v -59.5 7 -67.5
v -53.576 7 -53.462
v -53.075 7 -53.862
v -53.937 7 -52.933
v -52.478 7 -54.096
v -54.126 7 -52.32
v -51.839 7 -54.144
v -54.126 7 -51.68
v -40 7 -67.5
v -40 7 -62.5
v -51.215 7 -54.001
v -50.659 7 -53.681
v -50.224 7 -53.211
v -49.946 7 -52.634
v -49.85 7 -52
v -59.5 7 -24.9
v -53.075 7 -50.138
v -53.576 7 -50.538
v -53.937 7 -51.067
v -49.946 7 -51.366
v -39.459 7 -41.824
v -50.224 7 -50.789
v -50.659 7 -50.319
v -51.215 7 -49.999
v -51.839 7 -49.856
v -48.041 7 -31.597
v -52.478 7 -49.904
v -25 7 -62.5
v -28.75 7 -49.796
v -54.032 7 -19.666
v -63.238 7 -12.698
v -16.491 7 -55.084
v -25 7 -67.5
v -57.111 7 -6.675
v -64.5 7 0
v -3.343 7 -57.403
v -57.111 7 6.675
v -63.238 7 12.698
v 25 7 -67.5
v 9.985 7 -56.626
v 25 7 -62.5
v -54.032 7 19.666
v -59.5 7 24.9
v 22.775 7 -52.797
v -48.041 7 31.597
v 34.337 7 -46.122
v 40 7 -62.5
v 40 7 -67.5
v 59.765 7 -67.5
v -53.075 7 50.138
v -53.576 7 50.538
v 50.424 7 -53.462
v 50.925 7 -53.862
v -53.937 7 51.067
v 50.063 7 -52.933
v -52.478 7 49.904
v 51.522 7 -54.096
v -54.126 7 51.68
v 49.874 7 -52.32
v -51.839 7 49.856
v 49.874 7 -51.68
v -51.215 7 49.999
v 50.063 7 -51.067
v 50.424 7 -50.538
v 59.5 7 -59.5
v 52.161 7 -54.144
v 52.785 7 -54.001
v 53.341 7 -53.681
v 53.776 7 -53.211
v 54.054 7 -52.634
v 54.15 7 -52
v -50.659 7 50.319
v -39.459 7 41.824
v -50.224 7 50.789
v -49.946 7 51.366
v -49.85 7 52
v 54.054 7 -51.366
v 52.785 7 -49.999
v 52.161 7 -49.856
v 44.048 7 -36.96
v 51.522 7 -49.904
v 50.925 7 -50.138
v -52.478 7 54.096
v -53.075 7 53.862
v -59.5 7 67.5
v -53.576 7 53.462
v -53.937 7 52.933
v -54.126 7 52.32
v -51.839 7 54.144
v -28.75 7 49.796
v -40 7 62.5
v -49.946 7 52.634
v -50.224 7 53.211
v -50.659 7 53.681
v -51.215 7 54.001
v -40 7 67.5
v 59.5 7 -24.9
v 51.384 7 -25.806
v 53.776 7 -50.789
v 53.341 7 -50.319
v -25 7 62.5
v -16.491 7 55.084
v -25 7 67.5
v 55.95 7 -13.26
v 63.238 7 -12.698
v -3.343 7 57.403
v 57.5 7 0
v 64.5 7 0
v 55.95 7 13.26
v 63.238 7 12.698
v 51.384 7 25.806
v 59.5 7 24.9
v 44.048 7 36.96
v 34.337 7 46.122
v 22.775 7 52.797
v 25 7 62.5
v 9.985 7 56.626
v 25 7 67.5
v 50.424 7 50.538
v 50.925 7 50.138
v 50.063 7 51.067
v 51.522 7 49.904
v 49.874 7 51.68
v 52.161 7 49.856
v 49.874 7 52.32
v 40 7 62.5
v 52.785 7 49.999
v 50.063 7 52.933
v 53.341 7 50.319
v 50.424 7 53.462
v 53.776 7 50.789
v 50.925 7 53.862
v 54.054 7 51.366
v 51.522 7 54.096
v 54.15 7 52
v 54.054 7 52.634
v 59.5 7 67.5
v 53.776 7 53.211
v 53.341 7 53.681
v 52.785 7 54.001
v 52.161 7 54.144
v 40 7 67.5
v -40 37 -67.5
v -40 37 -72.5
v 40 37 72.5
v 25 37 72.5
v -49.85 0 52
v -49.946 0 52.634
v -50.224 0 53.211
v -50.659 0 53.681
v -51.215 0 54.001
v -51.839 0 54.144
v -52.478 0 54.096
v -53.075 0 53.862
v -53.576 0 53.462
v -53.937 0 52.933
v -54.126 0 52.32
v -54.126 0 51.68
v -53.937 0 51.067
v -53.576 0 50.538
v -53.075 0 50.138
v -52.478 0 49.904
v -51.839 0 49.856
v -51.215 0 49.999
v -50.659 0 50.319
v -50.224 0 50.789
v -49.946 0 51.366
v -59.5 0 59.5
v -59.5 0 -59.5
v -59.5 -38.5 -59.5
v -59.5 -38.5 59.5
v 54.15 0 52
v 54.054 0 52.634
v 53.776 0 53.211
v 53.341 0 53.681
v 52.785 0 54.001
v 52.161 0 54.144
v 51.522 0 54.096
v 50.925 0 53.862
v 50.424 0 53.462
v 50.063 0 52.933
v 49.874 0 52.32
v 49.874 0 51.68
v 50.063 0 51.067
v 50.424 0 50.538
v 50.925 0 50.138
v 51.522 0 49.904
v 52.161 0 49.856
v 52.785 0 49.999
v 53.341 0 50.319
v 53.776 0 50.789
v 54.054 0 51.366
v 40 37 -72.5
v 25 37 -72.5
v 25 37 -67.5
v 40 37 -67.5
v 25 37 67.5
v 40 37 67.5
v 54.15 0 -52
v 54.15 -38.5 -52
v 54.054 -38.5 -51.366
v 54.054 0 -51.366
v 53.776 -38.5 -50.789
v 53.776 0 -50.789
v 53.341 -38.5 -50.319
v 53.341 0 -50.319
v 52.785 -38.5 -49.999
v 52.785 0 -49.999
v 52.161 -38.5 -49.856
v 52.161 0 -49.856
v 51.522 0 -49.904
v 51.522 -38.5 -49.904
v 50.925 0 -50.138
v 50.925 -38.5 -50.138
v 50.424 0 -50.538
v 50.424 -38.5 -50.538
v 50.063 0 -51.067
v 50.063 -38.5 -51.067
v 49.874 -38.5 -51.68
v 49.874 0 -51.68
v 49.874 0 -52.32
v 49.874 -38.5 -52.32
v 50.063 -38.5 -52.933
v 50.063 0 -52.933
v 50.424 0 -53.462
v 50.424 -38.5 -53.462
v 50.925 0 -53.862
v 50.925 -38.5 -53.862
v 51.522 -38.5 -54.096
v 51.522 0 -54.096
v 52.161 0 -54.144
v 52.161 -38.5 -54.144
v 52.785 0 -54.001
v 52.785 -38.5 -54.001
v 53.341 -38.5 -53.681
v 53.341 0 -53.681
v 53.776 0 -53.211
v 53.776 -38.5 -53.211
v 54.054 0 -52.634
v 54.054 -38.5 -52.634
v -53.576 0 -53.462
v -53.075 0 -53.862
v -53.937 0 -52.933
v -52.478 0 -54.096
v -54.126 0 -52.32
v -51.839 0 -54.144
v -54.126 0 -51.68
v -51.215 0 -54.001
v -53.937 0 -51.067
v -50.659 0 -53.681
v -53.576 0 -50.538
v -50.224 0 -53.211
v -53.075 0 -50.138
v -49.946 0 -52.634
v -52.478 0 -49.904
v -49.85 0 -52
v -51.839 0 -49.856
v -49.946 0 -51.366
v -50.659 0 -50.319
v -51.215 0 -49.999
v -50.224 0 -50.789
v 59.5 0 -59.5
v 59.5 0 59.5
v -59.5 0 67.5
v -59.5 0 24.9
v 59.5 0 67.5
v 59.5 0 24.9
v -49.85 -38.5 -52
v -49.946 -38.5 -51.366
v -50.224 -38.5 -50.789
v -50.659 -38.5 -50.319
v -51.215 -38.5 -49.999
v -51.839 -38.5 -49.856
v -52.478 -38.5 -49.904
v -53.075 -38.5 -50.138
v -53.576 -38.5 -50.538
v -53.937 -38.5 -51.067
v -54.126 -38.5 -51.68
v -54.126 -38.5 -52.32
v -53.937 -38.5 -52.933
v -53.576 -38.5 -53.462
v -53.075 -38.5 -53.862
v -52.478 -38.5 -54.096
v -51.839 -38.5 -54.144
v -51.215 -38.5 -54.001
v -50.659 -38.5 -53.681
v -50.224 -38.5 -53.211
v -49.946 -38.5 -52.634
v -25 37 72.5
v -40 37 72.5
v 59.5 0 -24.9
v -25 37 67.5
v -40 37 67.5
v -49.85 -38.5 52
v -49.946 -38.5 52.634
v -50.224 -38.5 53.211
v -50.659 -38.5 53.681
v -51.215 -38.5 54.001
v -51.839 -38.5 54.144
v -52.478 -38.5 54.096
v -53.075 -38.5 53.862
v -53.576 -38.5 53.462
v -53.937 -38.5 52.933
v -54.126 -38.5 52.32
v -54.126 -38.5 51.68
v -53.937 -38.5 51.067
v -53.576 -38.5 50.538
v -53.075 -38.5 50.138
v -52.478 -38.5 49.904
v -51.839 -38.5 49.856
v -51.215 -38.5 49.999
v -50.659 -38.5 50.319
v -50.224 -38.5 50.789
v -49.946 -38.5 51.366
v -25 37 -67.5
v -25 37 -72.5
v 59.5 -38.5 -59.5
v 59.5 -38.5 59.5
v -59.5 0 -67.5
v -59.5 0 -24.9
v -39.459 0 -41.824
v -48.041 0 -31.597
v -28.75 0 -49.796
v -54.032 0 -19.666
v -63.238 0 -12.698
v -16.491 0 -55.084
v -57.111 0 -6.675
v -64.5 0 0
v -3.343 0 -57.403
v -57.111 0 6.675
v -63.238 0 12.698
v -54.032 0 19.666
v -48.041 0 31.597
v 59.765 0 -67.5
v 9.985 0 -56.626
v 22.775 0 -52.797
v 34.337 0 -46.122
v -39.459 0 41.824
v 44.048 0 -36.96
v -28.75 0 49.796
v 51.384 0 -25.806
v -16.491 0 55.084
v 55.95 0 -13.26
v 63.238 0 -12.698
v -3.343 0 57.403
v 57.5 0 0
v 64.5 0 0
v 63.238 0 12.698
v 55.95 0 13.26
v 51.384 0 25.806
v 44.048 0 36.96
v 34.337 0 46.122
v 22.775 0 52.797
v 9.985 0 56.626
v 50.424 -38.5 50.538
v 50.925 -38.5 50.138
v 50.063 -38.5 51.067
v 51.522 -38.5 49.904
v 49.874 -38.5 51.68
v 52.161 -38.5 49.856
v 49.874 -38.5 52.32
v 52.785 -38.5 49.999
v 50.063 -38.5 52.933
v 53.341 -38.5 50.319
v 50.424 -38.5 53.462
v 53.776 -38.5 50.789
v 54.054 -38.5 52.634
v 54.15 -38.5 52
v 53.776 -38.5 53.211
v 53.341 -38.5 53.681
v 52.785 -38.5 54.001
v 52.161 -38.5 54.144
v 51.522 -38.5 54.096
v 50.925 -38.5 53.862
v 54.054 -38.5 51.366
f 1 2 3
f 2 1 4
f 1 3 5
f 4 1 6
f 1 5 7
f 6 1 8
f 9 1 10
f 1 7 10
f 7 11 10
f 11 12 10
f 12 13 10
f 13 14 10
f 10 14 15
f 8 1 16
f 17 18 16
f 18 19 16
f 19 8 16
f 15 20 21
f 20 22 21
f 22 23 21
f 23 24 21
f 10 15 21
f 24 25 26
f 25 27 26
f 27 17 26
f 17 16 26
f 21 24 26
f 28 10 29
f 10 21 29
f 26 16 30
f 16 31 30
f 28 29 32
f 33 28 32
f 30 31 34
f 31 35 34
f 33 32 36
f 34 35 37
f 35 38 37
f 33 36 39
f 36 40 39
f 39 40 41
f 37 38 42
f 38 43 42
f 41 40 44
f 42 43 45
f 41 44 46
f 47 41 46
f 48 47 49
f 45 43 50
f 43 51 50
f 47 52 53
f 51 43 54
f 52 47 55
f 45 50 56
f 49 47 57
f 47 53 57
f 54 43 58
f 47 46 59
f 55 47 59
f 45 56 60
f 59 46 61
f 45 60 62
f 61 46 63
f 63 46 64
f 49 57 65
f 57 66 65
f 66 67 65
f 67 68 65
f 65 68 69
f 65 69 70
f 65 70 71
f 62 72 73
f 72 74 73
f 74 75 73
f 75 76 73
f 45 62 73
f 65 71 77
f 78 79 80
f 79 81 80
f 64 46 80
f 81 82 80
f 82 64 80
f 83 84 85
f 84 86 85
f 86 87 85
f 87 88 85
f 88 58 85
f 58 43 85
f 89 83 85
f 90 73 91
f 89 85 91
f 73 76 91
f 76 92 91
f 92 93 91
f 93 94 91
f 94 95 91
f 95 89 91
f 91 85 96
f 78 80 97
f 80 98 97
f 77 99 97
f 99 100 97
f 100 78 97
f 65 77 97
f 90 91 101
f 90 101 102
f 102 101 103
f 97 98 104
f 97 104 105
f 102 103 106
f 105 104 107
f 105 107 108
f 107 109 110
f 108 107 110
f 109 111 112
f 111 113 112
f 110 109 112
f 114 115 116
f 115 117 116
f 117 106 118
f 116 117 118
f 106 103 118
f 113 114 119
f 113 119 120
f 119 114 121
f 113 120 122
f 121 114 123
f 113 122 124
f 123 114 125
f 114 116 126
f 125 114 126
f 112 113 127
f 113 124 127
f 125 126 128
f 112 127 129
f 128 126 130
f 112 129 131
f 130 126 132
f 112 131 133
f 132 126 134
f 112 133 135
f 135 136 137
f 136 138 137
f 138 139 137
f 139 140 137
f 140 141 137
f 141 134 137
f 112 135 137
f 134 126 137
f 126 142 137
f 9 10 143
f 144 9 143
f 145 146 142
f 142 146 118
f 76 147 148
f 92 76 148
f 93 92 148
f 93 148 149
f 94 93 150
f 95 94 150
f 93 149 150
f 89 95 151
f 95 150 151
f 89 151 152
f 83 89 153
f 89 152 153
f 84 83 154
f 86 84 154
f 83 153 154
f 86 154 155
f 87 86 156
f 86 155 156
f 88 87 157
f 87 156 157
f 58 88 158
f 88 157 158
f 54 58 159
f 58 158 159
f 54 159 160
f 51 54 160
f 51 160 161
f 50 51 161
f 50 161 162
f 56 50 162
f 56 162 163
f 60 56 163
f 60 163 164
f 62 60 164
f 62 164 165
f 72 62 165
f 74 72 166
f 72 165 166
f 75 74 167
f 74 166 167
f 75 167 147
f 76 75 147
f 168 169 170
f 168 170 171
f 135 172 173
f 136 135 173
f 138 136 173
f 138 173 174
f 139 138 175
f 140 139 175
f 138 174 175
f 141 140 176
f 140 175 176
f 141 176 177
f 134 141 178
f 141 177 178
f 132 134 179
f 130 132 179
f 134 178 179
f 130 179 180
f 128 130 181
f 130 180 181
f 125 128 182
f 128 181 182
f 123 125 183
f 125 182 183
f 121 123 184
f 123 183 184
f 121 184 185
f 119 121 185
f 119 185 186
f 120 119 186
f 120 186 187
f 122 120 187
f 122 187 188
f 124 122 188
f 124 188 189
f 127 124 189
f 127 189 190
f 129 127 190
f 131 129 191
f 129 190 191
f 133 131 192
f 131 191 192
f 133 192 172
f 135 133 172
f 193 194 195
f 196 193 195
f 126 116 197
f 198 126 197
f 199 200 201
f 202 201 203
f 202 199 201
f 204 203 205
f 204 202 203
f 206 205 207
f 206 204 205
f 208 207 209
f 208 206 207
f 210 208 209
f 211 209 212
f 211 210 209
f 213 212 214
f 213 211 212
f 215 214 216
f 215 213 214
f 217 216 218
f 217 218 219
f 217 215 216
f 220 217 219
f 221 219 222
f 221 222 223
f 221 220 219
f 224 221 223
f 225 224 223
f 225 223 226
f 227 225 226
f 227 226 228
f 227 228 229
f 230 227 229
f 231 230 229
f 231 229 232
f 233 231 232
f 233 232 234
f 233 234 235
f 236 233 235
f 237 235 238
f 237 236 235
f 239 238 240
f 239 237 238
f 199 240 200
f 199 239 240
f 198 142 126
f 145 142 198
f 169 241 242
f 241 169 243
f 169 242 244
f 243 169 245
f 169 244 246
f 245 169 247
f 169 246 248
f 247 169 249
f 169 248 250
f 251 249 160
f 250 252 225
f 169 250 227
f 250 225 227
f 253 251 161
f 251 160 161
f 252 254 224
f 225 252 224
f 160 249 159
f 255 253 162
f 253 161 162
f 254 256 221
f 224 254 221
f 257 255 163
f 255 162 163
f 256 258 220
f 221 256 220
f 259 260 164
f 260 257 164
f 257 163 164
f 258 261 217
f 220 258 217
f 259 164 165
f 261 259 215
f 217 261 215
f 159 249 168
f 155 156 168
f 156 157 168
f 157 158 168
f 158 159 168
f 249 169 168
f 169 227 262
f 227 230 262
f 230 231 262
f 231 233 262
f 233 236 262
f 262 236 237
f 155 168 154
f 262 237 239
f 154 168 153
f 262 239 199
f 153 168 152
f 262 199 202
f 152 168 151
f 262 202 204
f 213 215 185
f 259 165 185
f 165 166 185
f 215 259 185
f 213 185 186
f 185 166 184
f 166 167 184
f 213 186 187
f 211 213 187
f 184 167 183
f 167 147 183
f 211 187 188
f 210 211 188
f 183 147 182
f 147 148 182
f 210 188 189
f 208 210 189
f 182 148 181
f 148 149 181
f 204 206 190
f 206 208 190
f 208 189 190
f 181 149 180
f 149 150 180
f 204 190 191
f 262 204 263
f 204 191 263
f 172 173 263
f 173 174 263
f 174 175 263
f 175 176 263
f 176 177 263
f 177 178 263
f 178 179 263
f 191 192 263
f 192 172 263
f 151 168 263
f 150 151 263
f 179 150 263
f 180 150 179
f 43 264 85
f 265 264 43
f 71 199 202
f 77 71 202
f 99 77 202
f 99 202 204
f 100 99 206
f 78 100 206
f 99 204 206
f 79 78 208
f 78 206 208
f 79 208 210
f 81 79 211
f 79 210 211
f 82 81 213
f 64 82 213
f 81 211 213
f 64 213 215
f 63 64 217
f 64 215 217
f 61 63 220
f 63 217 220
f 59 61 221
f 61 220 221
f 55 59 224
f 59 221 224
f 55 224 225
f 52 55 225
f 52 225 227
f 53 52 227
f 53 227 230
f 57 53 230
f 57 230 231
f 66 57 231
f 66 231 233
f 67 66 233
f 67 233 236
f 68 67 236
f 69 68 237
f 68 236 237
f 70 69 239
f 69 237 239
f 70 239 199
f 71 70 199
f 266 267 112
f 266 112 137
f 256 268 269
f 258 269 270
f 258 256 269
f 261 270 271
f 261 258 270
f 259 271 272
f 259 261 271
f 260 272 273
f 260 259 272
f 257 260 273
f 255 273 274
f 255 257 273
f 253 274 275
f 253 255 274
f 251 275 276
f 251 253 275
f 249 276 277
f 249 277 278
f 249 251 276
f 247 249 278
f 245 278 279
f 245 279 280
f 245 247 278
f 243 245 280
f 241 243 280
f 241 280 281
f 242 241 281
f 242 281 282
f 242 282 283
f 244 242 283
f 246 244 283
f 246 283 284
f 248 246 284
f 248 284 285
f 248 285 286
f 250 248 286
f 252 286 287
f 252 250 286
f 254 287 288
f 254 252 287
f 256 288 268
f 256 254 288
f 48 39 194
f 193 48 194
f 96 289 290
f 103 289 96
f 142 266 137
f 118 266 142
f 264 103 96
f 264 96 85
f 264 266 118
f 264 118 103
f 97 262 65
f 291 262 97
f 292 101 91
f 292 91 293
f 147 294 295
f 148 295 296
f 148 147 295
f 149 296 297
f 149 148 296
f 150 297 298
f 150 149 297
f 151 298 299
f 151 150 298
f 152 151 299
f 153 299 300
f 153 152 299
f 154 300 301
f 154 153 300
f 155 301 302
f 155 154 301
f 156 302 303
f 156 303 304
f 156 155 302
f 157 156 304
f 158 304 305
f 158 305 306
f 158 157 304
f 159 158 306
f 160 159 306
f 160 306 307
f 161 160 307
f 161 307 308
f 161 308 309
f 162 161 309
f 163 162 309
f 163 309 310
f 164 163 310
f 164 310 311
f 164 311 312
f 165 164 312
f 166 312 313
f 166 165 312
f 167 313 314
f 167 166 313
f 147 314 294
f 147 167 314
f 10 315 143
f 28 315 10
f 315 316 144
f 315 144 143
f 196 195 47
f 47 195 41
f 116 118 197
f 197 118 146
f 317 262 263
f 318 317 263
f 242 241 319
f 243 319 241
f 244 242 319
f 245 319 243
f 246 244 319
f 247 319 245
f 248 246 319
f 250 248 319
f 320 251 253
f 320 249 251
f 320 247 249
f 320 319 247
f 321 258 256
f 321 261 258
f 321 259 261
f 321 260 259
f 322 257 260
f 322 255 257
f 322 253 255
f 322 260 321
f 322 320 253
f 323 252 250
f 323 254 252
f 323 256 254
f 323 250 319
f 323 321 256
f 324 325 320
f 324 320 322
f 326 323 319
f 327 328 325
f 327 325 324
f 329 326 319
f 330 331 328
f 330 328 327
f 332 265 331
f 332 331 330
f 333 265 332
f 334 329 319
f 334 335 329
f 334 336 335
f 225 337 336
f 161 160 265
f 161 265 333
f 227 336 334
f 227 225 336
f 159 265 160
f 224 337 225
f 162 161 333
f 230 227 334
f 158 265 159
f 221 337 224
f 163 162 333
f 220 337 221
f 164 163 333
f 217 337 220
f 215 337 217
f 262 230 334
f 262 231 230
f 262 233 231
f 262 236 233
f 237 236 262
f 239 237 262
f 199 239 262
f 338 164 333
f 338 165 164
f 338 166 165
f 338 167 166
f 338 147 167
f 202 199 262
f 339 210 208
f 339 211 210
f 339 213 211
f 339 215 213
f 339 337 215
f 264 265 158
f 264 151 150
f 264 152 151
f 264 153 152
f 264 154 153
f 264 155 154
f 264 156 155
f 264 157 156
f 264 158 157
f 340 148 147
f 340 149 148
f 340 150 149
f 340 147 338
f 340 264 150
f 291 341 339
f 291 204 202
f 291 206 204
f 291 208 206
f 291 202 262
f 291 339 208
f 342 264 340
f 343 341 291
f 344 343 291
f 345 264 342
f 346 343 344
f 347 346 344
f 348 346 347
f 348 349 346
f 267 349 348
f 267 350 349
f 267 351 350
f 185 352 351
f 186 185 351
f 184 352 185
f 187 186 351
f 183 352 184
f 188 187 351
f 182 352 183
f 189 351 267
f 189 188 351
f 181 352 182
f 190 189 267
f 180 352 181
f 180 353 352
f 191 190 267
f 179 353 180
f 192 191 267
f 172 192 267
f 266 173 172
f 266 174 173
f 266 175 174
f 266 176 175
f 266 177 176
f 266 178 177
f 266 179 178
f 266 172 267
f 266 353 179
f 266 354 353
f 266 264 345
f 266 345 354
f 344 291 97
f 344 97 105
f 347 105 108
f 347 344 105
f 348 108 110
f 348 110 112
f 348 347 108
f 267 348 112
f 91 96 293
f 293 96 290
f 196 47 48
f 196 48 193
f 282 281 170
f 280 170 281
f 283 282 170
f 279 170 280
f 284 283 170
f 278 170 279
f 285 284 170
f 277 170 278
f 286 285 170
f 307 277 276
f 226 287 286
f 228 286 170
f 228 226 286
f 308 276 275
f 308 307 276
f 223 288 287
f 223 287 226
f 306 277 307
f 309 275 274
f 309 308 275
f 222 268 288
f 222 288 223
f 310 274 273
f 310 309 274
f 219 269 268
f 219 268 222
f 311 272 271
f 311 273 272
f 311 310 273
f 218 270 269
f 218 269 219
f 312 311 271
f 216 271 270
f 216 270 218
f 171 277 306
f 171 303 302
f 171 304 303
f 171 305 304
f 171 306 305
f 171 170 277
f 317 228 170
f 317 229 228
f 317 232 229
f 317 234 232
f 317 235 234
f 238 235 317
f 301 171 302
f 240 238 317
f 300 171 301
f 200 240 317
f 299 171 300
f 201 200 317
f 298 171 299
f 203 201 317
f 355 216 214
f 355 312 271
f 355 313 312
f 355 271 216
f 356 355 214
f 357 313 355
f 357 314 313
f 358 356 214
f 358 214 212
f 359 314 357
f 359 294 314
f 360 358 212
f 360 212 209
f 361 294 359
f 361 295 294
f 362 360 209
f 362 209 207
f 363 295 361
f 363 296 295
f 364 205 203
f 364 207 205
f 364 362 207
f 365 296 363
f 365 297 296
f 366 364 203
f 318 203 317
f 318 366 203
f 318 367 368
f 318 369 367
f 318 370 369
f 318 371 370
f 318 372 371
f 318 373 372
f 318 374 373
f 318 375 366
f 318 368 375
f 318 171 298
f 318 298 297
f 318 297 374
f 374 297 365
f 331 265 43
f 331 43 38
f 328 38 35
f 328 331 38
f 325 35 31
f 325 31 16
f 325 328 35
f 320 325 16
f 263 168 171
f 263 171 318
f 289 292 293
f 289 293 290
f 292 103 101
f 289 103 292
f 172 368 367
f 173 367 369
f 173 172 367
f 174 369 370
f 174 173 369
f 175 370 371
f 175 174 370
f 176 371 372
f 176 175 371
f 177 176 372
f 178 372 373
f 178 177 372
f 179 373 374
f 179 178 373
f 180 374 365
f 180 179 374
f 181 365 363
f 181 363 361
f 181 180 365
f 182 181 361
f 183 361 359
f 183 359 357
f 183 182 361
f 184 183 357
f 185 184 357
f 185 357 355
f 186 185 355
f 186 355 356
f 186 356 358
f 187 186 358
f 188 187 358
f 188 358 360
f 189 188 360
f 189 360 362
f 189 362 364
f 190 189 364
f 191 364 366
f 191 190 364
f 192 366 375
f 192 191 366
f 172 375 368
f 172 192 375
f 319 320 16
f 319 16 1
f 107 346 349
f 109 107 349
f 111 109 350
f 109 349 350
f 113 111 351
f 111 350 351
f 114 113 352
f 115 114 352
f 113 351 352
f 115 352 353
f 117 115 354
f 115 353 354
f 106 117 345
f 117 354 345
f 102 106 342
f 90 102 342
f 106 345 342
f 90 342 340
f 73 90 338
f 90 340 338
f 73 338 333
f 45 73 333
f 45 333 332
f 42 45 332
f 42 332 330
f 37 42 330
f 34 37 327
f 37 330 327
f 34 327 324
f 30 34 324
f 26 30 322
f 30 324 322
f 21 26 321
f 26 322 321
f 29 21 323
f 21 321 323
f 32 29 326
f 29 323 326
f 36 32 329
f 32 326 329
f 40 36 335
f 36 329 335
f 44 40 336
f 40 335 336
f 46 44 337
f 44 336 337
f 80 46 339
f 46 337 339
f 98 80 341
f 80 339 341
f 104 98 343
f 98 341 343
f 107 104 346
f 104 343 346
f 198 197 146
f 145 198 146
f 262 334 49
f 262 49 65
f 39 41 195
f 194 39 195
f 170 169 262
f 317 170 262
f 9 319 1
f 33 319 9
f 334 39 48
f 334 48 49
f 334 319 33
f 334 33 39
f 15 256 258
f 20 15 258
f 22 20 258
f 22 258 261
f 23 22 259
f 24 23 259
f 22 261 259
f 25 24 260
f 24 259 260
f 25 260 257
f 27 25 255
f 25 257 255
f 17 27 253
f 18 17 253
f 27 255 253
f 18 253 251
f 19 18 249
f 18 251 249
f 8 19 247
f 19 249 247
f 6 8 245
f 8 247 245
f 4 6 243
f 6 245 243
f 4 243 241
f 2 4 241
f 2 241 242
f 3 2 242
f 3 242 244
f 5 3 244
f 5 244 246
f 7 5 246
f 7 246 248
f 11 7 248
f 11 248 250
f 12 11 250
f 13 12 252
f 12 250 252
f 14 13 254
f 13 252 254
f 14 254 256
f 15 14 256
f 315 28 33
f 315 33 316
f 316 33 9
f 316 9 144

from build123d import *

# Parameters (mm, degrees)
F1_W     = 119
F1_H     = 119
F1_R     = 2.15
F2_DEPTH = 38.5
F3_R     = 2.15
F3_R_2   = 57.5
F4_DEPTH = 7
F6_START = 25
F6_DEPTH = 15


# Not quite as in the source:
# - a pattern or mirror of a feature is missing from the dataset's text; its kind, count and spacing are read off the source's solid


with BuildPart() as f2:
    # F1 (on Front) → F2 (new body)
    with BuildSketch(Plane.XZ):
        Rectangle(F1_W, F1_H)
        with Locations((-52, -52)):
            Circle(F1_R, mode=Mode.SUBTRACT)
        with Locations((52, -52)):
            Circle(F1_R, mode=Mode.SUBTRACT)
        with Locations((-52, 52)):
            Circle(F1_R, mode=Mode.SUBTRACT)
        with Locations((52, 52)):
            Circle(F1_R, mode=Mode.SUBTRACT)
    extrude(amount=F2_DEPTH)


with BuildPart() as f4:
    # F3 (on Front) → F4 (new body)
    with BuildSketch(Plane.XZ):
        with BuildLine():
            Line((59.7646775065, -67.5), (59.5, -59.5))
            Line((59.5, -59.5), (59.5, -24.899799196))
            ThreePointArc((59.5, -24.899799196), (64.5, 0), (59.5, 24.899799196))
            Line((59.5, 24.899799196), (59.5, 59.5))
            Line((59.5, 59.5), (59.5, 67.5))
            Line((59.5, 67.5), (-59.5, 67.5))
            Line((-59.5, 67.5), (-59.5, 59.5))
            Line((-59.5, 59.5), (-59.5, 24.899799196))
            ThreePointArc((-59.5, 24.899799196), (-64.5, 0), (-59.5, -24.899799196))
            Line((-59.5, -24.899799196), (-59.5, -59.5))
            Line((-59.5, -59.5), (-59.5, -67.5))
            Line((-59.5, -67.5), (59.7646775065, -67.5))
        make_face()
        with Locations((-52, -52)):
            Circle(F3_R, mode=Mode.SUBTRACT)
        with Locations((52, -52)):
            Circle(F3_R, mode=Mode.SUBTRACT)
        Circle(F3_R_2, mode=Mode.SUBTRACT)
        with Locations((-52, 52)):
            Circle(F3_R, mode=Mode.SUBTRACT)
        with Locations((52, 52)):
            Circle(F3_R, mode=Mode.SUBTRACT)
    extrude(amount=-F4_DEPTH)

    # F5 (on Right) → F6 (join)
    with BuildSketch(Plane.YZ.offset(F6_START)):
        Polygon((37, 72.5), (7, 67.5), (7, 62.5), (37, 67.5), align=None)
        Polygon((37, -67.5), (7, -62.5), (7, -67.5), (37, -72.5), align=None)
    f6 = extrude(amount=F6_DEPTH)

    # F6_copies: F6 across plane
    add(f6.mirror(Plane(origin=(0, 0, 0), x_dir=(0, 0, -1), z_dir=(-1, 0, 0))))


solid = Compound([f2.part, f4.part])
